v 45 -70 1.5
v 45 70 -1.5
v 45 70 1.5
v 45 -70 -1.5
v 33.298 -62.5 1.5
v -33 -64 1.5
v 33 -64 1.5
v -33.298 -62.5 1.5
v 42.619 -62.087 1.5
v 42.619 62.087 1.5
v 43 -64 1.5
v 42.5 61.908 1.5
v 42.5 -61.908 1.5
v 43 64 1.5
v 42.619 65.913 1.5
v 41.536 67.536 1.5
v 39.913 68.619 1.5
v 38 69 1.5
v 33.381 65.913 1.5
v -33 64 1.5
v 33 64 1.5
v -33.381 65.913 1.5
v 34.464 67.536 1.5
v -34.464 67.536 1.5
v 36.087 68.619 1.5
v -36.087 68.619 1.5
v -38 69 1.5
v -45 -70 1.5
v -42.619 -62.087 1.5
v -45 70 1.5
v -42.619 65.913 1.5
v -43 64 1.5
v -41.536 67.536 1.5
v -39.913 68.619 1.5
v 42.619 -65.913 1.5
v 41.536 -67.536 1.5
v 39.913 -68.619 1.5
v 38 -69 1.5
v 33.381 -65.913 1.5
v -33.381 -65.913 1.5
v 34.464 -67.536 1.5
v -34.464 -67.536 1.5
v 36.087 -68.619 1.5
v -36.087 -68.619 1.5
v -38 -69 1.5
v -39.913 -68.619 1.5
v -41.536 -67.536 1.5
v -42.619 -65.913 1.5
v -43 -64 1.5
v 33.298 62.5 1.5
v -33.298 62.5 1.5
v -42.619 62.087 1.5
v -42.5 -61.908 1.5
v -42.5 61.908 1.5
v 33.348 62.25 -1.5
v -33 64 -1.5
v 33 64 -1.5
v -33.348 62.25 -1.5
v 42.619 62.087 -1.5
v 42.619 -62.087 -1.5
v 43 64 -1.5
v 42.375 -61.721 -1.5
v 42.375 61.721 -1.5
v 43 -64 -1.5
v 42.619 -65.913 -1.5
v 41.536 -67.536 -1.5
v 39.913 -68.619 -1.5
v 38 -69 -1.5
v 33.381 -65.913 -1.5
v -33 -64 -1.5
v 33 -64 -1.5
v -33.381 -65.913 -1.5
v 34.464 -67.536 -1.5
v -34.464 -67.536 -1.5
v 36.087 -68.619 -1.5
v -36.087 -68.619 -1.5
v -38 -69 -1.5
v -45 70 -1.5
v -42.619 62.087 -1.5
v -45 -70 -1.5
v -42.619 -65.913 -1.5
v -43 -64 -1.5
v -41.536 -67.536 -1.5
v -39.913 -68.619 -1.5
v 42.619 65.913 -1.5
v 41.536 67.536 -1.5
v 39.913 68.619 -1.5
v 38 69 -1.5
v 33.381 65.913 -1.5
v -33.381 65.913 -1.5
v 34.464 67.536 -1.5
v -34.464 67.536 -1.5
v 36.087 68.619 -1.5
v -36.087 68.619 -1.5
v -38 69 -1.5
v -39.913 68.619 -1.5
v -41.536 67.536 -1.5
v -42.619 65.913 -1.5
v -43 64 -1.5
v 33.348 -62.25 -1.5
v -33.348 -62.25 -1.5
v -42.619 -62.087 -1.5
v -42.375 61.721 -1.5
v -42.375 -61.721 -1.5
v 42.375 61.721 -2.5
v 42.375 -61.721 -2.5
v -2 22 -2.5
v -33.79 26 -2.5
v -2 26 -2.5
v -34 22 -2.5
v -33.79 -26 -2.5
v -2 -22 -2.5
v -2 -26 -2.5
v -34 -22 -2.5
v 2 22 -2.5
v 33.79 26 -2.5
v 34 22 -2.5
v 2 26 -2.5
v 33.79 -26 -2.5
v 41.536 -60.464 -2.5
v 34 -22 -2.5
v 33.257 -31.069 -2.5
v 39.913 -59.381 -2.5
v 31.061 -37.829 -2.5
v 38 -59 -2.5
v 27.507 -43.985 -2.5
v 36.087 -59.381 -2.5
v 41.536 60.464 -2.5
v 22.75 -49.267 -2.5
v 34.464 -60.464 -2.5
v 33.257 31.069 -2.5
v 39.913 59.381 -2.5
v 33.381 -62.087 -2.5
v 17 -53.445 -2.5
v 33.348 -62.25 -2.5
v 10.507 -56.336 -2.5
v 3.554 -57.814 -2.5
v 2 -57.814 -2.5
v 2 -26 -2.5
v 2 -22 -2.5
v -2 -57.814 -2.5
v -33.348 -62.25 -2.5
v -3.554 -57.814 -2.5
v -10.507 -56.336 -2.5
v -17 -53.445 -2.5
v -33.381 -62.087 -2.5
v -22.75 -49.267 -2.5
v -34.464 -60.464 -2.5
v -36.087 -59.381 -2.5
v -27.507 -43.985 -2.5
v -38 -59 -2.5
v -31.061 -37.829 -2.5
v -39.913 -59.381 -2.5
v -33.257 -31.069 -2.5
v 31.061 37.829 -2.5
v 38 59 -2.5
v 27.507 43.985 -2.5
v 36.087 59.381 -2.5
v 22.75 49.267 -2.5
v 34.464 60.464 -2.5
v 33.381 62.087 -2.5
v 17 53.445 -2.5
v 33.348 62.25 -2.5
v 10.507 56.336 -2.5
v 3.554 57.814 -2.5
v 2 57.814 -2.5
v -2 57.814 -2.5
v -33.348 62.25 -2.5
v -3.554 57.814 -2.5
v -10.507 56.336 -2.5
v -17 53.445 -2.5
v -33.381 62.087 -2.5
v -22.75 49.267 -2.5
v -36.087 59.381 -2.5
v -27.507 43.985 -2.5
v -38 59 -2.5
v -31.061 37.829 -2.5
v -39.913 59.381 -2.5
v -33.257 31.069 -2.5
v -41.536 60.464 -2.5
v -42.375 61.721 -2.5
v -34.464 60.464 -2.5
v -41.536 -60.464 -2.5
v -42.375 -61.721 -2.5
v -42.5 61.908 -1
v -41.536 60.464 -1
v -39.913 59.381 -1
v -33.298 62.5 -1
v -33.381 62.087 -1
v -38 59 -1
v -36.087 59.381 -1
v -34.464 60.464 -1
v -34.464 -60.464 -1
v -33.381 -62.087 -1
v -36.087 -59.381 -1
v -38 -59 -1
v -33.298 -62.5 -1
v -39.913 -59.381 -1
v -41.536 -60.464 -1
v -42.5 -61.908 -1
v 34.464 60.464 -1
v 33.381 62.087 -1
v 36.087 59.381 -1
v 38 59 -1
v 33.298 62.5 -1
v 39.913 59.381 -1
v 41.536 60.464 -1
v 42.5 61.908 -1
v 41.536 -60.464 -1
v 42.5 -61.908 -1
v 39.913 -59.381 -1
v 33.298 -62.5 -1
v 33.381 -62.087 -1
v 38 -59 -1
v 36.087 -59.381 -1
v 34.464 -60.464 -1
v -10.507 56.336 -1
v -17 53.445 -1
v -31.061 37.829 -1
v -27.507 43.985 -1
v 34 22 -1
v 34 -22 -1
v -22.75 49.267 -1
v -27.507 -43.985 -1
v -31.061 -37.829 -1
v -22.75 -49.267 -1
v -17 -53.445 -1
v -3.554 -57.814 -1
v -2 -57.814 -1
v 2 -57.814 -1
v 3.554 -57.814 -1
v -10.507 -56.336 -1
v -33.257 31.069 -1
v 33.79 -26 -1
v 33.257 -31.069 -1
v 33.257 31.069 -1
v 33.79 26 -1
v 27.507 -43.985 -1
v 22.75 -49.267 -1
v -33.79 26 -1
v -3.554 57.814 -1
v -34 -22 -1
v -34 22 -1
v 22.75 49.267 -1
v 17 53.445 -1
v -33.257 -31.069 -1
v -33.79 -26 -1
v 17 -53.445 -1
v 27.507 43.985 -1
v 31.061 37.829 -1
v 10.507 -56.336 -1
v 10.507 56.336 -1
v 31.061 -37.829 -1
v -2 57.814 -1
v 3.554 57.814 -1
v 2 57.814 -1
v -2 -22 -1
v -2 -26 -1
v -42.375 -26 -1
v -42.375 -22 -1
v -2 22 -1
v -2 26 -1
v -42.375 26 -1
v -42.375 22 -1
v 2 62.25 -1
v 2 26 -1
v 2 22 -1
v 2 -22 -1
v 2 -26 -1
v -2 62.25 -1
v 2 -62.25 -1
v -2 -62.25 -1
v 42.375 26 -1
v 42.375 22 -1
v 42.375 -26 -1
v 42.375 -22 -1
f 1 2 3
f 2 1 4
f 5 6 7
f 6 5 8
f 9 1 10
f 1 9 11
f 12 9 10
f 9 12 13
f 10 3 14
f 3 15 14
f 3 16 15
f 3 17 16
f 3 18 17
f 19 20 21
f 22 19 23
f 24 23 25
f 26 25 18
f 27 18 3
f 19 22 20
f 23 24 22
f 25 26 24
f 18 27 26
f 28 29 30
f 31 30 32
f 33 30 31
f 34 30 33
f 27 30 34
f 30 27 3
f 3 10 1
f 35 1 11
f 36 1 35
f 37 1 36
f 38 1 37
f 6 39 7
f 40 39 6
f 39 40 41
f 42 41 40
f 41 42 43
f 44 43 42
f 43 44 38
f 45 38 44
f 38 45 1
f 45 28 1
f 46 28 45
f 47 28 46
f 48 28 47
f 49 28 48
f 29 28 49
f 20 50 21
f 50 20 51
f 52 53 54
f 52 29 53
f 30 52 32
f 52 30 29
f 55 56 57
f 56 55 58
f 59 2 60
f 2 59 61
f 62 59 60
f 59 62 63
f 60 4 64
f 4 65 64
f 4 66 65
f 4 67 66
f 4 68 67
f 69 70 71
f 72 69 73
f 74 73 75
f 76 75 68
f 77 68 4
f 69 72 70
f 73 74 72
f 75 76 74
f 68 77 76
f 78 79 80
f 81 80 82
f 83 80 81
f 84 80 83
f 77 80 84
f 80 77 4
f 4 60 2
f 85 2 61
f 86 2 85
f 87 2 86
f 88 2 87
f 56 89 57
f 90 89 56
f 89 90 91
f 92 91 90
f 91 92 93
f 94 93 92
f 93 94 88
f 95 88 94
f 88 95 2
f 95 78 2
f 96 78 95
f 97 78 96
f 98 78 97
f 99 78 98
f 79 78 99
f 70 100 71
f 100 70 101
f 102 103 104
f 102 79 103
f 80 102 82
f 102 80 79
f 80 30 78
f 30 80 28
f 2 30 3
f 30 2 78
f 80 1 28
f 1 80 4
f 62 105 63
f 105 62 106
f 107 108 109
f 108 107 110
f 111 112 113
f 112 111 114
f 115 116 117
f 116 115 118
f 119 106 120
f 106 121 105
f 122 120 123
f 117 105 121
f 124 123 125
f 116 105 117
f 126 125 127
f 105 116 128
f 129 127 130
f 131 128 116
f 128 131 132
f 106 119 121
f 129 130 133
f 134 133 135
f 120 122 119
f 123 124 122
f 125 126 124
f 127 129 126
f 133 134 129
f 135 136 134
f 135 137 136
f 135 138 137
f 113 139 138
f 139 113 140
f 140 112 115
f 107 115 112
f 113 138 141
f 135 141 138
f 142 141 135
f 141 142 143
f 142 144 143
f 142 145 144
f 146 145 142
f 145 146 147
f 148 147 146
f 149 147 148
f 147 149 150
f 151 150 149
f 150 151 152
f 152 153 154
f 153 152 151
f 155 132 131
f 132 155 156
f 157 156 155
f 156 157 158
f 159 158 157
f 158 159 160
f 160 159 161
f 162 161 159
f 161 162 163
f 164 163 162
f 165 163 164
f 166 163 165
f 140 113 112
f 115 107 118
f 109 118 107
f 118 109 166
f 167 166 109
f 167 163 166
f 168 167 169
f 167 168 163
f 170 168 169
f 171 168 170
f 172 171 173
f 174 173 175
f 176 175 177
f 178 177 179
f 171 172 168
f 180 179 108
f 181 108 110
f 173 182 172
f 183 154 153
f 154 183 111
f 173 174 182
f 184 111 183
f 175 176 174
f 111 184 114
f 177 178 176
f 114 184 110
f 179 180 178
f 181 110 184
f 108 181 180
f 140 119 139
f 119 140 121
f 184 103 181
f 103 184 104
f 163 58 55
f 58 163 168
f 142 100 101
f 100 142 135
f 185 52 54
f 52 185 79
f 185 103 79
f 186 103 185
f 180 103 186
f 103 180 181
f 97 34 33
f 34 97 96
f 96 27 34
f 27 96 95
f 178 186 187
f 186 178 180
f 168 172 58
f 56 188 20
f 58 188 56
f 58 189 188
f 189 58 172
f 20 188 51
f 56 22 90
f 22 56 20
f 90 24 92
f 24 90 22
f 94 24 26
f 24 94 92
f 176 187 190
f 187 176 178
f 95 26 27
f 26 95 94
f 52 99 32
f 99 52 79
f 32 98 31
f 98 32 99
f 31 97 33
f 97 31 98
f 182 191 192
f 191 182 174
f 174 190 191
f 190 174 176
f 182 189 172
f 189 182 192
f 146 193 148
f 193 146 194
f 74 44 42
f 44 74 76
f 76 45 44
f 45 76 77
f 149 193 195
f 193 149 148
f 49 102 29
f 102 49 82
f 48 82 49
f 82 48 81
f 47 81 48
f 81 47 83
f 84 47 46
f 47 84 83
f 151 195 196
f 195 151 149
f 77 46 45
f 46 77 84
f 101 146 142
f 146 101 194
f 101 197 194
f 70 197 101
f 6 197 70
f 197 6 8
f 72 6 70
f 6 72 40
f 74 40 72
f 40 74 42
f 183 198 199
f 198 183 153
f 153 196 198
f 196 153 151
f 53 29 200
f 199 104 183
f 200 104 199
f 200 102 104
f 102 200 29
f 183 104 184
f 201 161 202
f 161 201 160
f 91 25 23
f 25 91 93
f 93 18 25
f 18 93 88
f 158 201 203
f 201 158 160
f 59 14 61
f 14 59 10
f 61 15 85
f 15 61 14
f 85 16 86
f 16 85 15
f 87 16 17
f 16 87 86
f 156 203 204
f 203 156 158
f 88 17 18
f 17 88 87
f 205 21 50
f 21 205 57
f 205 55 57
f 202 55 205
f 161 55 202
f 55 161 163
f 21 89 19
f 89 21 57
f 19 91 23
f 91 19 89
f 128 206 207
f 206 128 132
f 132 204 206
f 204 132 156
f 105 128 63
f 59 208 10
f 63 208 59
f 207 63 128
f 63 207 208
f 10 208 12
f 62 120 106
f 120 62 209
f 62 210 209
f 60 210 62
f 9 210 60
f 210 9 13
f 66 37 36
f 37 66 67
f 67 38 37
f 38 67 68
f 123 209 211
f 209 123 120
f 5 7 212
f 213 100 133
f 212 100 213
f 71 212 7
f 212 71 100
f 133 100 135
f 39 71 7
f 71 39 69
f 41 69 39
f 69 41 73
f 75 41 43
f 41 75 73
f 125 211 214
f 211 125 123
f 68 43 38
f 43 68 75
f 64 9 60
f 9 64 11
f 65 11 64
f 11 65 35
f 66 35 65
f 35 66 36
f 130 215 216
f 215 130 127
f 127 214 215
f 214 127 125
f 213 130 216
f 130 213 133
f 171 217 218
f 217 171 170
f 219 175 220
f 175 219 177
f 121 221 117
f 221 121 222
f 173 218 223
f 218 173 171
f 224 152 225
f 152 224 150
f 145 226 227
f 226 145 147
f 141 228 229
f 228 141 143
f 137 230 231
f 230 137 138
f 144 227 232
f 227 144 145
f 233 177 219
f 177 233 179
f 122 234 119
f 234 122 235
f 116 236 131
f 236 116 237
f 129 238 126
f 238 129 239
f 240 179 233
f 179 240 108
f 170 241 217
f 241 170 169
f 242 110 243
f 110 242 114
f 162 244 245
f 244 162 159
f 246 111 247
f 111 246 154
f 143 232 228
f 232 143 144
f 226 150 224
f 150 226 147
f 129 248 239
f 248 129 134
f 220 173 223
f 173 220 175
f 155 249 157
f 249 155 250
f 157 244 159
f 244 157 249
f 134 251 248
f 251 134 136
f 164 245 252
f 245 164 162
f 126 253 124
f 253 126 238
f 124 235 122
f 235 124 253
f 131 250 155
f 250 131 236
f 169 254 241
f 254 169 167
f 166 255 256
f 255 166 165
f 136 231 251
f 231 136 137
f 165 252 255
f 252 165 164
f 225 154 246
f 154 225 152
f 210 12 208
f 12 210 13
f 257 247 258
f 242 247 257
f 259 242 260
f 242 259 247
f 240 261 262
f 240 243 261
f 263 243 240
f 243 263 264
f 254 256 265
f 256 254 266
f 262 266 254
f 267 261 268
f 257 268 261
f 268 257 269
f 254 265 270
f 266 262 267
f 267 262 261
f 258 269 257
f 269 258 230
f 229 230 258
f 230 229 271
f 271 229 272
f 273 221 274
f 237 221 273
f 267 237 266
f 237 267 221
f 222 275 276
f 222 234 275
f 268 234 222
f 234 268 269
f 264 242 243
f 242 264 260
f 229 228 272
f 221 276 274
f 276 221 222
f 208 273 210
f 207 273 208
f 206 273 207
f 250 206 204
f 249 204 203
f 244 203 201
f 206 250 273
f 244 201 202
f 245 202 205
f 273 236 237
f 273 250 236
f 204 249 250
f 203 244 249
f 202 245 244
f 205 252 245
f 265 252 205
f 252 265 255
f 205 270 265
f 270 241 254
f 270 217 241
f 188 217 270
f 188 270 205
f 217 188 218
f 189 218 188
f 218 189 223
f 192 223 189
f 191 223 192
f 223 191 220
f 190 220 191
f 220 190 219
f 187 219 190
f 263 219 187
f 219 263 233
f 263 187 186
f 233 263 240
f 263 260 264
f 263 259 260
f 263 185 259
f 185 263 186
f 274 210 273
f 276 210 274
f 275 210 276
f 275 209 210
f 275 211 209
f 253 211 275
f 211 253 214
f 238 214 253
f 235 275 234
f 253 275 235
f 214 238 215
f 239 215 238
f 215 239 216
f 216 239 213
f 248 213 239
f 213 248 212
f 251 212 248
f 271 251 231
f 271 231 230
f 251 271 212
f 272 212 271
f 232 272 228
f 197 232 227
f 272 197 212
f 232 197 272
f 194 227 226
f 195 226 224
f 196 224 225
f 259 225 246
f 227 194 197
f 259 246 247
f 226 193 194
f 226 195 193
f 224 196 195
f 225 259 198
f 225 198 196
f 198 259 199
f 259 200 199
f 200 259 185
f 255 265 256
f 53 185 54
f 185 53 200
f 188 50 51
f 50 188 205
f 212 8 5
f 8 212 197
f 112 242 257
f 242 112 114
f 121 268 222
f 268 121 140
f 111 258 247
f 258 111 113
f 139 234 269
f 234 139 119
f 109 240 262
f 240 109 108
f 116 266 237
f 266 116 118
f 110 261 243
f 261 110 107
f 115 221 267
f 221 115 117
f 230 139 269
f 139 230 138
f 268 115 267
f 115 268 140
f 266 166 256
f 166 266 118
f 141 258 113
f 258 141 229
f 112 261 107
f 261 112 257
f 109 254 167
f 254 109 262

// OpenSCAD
// file: connector-pegs.scad
//////////////////////////////////////////////////////////////////
// This module is used for generating the peg cutouts and pegs. //
//////////////////////////////////////////////////////////////////

// peg_space: This controls the X-axis space between the pegs.
// number_of_pegs: This defines the number of pegs to generate.
// peg_height: This defines the Z-axis height of the peg.
// peg_radius: This determines the diameter/circumferance of each peg.
// peg_y_position: This determines the Y-axis position of the pegs.

// This generates the GREEN peg clip.
module peg_connector_clip(connector_clip_x, connector_clip_y, connector_clip_z) {
    color("green")
    cube([connector_clip_x, connector_clip_y, connector_clip_z],true);
    translate([connector_clip_y+2,0,.25])
    cube([2,5,2.5],true);
}

// This generates the WHITE hole size in the Blue peg so the GREEN clip can slide in.
module peg_connector_hole(connector_clip_x, connector_clip_y, connector_clip_z) {
    color("white")
    peg_connector_clip(connector_clip_x+.25, connector_clip_y+.25, connector_clip_z);
}

// This module combines and diffs the WHITE hole from the BLUE peg.
module peg(peg_height, peg_radius, connector_clip_x, connector_clip_y, connector_clip_z) {
    difference() {
        // This generates the BLUE peg.
        color("blue")
        cylinder(h = peg_height, r1 = peg_radius, r2 = peg_radius, center = true);
        
        // This is the WHITE peg Hole.
        rotate([0,0,90])
        translate([2, 0, +4])
        peg_connector_hole(connector_clip_x, connector_clip_y, connector_clip_z);
    }
}

// This module generates "number_of_pegs" at "pegs_space" in millimeters apart.
module holder_pegs(peg_space, number_of_pegs, peg_height, peg_radius, connector_clip_x, connector_clip_y, connector_clip_z) {
    for (i=[0: 360/number_of_pegs: 360])
        rotate([0,0,i])
        translate([peg_space,0,0])
        peg(peg_height, peg_radius, connector_clip_x, connector_clip_y, connector_clip_z);
}


peg_y_position=20;

translate([0,peg_y_position,0])
holder_pegs(peg_space=60,
            number_of_pegs=2,
            peg_height=12,
            peg_radius=5,
            connector_clip_x=13,
            connector_clip_y=3,
            connector_clip_z=2);

//translate([0,-peg_y_position,0])
//holder_pegs(peg_space=60,
//            number_of_pegs=2,
//            peg_height=12,
//            peg_radius=5,
//            connector_clip_x=10,
//            connector_clip_y=3,
//            connector_clip_z=2);

//peg_connector_clip(connector_clip_x=10,
//                   connector_clip_y=3,
//                   connector_clip_z=2);
// main file
/////////////////////////////////////////////////////////////////
// This module is used for maintaining the PM2.5 Filter holder.//
/////////////////////////////////////////////////////////////////

// This imports the peg hole's to make the cutouts in the filter holder.
use <connector-pegs.scad>

module universal_filter_holder(filter_holder_x, filter_holder_y, filter_holder_z, filter_hole_height,filter_hole_radius, filter_hole_length, peg_space, peg_y_position, number_of_pegs, peg_height, peg_radius,connector_clip_x, connector_clip_y, connector_clip_z) {
    
    difference() {
        
        // This section is for creating the base rectangle for the filter holder.
        union() {
            // This section is for creating the YELLOW rectangle pieces of the filter holder.
            color("yellow")
            cube([filter_holder_x, filter_holder_y, filter_holder_z], center=true);
            
            // This section is for creating the RED rectangle pieces of the filter holder.
            translate([0,0,-1])
            color("red")
            cube([90-5.25, 124.5, filter_holder_z], center=true);
            
        }
    

        //This Section is for maintaining the large PINK center cutout for the air to pass through.
        translate([0, -filter_hole_length/2, 0])
        color("pink")
        hull() {
            translate([0, filter_hole_length, 0]) 
            cylinder(h = filter_hole_height, r1 = filter_hole_radius, r2 = filter_hole_radius, center = true);
            
            translate([0,0,-1])
            cylinder(h = filter_hole_height, r1 = filter_hole_radius, r2 = filter_hole_radius, center = true);
        }
        
        // This section is for making the PURPLE gap for holding the filter.
         translate([0,0,1])
         color("purple")
         cube([filter_holder_x-5, filter_holder_y-15, filter_holder_z+1], center=true);
    
        // This section is for cutting out the BLUE peg holes. Color defined in connector_pegs.scad file.
        // use <connector-pegs.scad>
        rotate([0,0,90])
        translate([0,peg_y_position,0])
        holder_pegs(peg_space, number_of_pegs, peg_height, peg_radius, connector_clip_x, connector_clip_y, connector_clip_z);

        rotate([0,0,90])
        translate([0,-peg_y_position,0])
    holder_pegs(peg_space, number_of_pegs, peg_height, peg_radius, connector_clip_x, connector_clip_y, connector_clip_z);
        
        }
    // The following 3 section create crossbar holders for the filters to secure them.    
    translate([0, -filter_hole_length/2, -1.75])  
    cube([filter_holder_x-5.25, 4, 1.5], center=true);
        
    translate([0, filter_hole_length/2, -1.75])  
    cube([filter_holder_x-5.25, 4, 1.5], center=true);
             
    translate([0, 0, -1.75])  
    cube([4, filter_holder_y-15.5, 1.5], center=true);

}

// Bottom Layer top
universal_filter_holder(filter_holder_x=90,
              filter_holder_y=140,
              filter_holder_z=3,
              filter_hole_height = 6,
              filter_hole_radius = 34,
              filter_hole_length = 48,
              peg_y_position=38,
              peg_space=64,
              number_of_pegs=2,
              peg_height=10,
              peg_radius=5,
              connector_clip_x=10,
              connector_clip_y=3,
              connector_clip_z=2);
